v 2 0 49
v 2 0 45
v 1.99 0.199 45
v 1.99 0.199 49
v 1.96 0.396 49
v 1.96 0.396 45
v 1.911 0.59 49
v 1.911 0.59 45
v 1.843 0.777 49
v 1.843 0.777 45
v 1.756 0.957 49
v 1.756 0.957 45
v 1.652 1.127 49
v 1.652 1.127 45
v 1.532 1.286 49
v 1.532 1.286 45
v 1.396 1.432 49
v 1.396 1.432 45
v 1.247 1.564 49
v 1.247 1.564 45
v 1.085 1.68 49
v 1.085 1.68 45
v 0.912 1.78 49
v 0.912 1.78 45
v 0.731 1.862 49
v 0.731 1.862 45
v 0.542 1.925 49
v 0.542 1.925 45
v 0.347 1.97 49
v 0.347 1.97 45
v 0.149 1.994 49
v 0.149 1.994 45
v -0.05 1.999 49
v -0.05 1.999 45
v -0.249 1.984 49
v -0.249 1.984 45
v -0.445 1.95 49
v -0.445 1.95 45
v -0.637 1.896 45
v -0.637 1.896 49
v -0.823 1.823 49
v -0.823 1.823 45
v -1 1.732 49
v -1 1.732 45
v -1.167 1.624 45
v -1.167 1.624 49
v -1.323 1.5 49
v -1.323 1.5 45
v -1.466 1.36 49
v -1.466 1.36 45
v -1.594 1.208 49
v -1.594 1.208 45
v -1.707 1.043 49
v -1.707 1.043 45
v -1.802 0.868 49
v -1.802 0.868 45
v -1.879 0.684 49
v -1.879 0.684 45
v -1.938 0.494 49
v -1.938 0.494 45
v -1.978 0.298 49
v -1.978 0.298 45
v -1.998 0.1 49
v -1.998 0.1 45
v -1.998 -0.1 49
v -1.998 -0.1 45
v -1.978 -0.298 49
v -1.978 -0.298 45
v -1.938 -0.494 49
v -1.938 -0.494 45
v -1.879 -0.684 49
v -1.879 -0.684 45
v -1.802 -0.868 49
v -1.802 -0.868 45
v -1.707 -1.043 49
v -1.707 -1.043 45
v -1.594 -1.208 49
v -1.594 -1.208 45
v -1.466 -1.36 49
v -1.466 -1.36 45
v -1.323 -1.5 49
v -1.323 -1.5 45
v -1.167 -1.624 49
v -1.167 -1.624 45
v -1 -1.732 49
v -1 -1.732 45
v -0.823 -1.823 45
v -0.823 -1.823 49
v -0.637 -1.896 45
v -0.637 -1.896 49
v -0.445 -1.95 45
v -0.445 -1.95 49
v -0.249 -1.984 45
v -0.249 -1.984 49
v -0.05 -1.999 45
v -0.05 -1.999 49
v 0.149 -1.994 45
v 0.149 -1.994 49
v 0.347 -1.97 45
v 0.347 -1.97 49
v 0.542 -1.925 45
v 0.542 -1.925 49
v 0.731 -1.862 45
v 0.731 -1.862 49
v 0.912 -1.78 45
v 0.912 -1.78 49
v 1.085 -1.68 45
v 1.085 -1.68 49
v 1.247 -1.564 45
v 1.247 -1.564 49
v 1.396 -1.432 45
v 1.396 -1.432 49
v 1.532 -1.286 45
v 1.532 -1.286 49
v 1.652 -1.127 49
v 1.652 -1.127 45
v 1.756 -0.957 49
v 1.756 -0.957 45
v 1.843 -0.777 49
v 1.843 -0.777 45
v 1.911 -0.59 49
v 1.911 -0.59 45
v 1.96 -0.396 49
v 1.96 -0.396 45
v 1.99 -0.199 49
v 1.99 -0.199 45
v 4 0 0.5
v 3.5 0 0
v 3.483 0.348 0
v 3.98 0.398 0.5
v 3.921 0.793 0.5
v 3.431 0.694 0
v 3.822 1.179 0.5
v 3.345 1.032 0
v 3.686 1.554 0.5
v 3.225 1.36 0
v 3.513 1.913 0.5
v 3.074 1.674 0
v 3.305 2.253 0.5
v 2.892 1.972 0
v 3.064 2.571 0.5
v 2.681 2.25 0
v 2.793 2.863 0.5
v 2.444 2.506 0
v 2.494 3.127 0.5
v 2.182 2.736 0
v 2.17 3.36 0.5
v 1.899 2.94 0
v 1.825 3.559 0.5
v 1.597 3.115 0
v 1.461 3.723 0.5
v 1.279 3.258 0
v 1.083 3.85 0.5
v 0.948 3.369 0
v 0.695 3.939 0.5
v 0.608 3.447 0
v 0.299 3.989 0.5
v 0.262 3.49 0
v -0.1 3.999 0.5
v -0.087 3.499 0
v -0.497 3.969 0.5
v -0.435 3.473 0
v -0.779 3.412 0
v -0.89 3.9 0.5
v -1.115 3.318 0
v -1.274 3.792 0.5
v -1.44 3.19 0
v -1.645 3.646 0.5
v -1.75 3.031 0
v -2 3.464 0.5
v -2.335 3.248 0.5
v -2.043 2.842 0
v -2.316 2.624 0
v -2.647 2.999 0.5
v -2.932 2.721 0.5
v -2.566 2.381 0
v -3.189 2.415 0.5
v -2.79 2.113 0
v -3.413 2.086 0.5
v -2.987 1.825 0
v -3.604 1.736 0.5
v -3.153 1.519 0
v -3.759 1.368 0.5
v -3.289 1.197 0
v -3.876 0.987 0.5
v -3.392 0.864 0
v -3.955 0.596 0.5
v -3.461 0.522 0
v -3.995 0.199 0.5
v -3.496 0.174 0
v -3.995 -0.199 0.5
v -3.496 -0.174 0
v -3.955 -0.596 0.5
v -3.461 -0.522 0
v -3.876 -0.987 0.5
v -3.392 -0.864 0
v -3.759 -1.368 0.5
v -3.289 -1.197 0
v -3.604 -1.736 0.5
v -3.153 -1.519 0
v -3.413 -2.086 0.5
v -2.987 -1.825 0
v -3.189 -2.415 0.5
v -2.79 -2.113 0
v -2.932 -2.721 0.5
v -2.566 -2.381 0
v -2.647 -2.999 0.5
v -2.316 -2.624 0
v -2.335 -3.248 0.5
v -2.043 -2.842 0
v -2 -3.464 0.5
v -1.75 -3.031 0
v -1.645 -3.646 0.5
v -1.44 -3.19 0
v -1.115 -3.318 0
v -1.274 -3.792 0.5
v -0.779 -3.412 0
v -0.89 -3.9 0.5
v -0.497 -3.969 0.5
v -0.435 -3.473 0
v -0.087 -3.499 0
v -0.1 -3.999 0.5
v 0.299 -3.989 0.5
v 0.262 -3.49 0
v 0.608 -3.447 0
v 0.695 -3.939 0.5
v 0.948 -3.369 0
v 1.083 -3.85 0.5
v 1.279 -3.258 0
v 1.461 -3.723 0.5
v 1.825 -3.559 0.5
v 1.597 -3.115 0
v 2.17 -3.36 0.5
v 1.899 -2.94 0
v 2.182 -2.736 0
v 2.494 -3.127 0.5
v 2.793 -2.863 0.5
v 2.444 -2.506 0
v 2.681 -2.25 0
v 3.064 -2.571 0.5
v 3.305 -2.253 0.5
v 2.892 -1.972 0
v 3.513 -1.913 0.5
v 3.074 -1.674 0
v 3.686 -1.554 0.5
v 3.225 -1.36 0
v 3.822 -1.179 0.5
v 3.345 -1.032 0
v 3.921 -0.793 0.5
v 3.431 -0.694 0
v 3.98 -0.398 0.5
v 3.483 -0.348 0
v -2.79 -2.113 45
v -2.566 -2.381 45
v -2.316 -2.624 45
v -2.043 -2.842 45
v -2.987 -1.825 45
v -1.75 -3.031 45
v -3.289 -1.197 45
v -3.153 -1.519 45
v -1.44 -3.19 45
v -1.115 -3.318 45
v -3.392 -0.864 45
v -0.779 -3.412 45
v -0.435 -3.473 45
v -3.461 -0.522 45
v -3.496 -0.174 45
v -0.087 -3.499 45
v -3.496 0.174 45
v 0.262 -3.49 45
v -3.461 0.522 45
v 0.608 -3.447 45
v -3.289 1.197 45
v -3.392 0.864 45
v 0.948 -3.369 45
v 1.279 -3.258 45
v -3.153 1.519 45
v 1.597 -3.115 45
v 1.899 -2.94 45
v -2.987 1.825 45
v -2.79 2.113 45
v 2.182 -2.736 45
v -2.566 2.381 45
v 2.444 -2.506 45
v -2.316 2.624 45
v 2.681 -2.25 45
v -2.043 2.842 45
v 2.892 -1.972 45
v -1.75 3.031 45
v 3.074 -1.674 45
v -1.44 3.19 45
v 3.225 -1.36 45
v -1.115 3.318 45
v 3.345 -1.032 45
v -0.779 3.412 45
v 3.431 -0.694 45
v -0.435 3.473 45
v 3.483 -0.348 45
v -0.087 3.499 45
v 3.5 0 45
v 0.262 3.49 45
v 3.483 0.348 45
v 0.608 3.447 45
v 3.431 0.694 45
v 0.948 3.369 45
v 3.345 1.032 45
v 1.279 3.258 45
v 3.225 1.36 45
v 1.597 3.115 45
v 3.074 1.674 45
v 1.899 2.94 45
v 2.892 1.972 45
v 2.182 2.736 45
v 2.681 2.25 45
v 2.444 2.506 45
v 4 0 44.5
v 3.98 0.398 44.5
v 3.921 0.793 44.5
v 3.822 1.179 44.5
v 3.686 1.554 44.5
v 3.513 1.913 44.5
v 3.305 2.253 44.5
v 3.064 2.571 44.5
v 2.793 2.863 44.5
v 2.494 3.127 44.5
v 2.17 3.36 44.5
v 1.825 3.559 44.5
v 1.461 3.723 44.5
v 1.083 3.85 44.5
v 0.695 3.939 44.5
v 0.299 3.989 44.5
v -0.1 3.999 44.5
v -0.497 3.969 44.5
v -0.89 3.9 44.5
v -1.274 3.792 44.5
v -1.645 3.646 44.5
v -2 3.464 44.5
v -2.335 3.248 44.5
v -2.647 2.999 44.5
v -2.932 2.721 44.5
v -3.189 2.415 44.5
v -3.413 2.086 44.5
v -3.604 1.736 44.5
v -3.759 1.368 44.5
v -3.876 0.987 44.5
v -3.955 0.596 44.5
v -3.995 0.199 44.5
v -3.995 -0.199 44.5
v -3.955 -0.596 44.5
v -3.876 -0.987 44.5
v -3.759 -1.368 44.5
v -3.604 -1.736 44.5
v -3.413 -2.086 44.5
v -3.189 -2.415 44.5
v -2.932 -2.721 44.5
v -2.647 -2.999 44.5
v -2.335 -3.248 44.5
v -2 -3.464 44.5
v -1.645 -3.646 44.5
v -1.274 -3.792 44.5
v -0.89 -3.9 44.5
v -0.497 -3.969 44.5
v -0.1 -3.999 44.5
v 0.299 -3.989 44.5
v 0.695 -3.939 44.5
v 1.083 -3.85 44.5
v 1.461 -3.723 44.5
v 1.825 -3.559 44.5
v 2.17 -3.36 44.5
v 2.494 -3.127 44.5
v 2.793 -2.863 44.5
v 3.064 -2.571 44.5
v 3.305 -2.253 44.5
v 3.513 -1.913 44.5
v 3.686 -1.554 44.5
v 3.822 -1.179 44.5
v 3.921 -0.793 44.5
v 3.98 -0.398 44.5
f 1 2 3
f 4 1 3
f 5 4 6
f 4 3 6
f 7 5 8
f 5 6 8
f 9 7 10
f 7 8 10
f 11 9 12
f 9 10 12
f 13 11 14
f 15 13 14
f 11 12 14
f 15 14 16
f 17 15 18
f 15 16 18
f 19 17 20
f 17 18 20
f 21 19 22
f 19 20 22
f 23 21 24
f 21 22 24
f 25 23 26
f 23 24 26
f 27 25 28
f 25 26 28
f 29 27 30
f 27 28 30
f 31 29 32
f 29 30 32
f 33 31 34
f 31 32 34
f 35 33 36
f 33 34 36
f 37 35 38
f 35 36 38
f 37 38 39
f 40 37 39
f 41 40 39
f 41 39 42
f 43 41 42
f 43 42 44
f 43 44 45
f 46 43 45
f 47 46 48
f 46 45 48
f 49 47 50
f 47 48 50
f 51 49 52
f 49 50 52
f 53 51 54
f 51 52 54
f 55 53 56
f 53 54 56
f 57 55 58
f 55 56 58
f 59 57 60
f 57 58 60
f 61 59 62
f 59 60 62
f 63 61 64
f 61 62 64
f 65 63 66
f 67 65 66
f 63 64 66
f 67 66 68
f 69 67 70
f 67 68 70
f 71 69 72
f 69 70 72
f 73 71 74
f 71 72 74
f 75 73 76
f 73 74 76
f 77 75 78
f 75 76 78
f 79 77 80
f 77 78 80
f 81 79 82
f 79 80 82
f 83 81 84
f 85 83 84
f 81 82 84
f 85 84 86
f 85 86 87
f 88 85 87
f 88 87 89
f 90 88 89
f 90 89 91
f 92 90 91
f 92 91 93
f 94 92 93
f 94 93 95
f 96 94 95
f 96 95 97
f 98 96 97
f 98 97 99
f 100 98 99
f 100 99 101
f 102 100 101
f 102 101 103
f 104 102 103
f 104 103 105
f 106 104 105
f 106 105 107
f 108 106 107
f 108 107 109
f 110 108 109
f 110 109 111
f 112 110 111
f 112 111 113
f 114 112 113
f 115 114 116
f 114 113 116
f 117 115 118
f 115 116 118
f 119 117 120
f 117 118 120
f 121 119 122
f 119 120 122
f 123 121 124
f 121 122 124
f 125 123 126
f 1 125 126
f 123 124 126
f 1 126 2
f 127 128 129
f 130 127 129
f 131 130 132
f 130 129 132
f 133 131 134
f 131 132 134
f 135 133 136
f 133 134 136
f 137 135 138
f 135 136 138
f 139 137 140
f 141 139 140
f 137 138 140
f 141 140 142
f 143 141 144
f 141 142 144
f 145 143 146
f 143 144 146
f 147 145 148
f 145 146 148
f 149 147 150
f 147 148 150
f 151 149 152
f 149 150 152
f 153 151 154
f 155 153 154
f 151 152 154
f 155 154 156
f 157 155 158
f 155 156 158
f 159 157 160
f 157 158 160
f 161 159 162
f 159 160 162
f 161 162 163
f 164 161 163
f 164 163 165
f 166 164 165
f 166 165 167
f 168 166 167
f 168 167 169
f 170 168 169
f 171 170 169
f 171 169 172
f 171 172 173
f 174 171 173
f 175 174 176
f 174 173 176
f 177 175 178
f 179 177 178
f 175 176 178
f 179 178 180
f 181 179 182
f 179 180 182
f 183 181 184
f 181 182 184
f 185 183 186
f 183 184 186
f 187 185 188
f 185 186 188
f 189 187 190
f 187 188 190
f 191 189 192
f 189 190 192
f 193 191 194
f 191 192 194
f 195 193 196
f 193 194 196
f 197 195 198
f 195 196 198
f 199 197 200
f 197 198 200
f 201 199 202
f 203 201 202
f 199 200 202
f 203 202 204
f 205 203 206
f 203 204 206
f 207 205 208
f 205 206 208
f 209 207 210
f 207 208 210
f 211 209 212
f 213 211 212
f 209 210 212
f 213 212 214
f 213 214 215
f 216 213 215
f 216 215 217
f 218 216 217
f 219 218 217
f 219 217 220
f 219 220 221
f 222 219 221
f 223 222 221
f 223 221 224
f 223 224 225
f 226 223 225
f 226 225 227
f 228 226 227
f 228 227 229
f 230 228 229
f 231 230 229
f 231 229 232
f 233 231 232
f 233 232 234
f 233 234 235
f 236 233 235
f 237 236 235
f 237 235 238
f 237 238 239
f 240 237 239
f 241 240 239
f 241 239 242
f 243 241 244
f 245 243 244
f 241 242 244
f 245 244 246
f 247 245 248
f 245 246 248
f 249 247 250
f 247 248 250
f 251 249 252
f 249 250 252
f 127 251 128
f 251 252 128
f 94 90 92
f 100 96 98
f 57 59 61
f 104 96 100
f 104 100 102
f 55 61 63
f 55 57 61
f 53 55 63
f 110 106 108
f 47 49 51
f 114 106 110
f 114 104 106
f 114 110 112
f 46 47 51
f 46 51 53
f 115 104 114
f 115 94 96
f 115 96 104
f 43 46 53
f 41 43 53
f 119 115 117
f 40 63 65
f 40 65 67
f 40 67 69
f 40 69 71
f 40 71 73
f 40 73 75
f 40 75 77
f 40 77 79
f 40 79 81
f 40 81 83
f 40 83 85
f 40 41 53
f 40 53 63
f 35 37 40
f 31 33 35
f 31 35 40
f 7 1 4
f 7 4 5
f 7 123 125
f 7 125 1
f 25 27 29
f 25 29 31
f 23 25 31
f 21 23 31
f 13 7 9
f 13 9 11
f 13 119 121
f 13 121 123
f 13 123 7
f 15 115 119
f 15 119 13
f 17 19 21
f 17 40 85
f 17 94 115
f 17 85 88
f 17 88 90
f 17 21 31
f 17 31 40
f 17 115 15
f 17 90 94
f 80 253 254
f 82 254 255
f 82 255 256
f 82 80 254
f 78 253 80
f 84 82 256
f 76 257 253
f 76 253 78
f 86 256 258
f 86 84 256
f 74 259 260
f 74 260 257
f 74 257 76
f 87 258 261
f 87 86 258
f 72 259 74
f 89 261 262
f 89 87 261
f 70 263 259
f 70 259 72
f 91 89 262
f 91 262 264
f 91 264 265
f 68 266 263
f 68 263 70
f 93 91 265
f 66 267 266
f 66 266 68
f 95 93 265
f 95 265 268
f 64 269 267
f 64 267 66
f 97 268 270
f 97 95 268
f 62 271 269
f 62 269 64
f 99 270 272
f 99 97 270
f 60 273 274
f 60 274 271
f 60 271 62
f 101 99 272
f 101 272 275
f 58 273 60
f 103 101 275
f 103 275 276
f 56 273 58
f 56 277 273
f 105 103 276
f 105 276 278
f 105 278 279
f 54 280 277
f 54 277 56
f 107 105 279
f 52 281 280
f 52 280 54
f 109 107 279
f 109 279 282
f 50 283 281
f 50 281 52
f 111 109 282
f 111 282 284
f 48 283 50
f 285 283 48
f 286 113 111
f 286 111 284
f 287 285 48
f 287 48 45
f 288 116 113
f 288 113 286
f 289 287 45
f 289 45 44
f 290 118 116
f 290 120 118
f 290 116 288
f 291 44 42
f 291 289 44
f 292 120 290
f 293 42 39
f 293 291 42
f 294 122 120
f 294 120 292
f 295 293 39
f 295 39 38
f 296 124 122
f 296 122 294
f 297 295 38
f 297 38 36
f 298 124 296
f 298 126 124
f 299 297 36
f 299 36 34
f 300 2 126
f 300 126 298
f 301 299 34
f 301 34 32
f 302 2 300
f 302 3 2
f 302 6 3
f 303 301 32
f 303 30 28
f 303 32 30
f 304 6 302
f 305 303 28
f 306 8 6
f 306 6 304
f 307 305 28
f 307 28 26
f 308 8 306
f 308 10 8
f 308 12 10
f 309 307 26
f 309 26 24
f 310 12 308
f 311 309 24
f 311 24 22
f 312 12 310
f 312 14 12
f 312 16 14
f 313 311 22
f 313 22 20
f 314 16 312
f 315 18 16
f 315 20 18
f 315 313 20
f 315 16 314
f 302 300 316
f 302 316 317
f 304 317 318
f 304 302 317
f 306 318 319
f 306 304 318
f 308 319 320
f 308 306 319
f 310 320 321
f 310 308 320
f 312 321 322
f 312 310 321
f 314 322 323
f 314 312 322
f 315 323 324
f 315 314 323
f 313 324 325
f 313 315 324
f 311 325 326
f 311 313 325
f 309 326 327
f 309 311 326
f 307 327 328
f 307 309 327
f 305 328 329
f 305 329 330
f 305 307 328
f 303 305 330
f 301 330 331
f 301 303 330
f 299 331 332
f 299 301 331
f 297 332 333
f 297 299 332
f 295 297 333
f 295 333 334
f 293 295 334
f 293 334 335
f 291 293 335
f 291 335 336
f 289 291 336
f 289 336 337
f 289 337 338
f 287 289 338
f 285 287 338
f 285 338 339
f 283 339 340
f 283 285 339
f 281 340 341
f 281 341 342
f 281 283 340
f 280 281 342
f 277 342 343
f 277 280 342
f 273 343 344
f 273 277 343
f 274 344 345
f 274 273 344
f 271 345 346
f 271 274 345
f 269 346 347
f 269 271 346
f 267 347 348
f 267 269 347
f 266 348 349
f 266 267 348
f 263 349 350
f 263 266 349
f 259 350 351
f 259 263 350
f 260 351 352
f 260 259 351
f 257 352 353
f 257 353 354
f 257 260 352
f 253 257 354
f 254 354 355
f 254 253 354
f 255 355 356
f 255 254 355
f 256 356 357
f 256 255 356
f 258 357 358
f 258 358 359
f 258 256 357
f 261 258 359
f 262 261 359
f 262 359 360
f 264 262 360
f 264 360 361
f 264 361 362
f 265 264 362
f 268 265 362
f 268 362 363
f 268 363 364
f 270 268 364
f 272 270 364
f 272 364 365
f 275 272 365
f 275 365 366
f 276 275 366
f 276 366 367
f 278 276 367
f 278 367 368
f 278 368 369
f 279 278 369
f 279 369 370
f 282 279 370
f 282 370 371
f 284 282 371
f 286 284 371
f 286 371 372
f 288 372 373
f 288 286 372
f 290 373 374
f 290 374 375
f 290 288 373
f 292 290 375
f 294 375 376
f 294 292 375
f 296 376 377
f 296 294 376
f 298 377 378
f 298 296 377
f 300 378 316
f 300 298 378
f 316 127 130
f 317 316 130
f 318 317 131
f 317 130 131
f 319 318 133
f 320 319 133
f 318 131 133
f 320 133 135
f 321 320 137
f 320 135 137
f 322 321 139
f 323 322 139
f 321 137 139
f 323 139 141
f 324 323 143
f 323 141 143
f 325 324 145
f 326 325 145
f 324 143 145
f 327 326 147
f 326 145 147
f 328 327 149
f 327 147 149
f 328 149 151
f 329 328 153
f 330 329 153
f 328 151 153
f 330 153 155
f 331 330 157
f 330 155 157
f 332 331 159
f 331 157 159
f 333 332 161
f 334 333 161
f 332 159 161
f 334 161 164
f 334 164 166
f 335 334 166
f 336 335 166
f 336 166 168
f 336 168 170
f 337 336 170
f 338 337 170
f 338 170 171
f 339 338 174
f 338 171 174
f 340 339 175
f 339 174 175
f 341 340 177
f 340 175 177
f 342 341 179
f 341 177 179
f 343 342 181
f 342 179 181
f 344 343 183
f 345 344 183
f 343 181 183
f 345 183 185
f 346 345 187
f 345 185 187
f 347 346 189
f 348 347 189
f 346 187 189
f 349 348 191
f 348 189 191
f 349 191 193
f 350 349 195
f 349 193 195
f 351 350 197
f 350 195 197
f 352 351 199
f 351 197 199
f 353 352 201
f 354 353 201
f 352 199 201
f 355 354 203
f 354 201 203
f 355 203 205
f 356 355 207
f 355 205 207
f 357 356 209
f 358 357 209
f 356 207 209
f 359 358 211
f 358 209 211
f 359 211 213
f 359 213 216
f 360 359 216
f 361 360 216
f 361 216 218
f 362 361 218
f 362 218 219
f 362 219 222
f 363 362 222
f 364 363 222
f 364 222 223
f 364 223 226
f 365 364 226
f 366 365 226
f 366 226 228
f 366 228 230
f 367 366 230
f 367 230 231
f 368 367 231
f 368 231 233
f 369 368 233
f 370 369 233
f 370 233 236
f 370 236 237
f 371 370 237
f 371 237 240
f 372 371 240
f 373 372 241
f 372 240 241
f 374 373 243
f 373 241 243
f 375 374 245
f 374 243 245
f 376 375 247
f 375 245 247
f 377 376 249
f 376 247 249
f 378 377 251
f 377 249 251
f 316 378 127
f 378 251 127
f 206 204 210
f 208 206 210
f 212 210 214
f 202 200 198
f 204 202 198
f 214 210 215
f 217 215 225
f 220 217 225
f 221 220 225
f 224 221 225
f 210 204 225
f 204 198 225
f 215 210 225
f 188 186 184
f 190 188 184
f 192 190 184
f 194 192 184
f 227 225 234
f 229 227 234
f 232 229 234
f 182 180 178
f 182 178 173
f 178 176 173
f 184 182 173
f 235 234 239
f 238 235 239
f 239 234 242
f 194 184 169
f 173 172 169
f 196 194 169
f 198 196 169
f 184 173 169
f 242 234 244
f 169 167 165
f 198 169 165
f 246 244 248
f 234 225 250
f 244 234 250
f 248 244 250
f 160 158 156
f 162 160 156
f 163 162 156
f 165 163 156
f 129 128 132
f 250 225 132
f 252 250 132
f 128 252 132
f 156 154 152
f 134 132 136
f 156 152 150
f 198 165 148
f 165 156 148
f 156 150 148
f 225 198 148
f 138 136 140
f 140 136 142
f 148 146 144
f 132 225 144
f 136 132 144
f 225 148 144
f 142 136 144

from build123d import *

# Parameters (mm, degrees)
ESQUISSE1_R          = 4
BASE_EXTRUSION_DEPTH = 45
CHANFREIN1_SIZE      = 0.5
ESQUISSE2_R          = 2
BOSS_EXTRU_1_DEPTH   = 4


with BuildPart() as part:
    # Esquisse1 → Base-Extrusion (new body)
    with BuildSketch(Plane.XY):
        Circle(ESQUISSE1_R)
    extrude(amount=BASE_EXTRUSION_DEPTH)

    # Chanfrein1
    chanfrein1_edges = [part.edges().sort_by_distance(p)[0] for p in [
        (-4, 0, 0),
        (-4, 0, 45),
    ]]
    chamfer(chanfrein1_edges, length=CHANFREIN1_SIZE)

    # Esquisse2 → Boss.-Extru.1 (add)
    with BuildSketch(Plane.XY.offset(45)):
        Circle(ESQUISSE2_R)
    extrude(amount=BOSS_EXTRU_1_DEPTH)


solid = part.part
